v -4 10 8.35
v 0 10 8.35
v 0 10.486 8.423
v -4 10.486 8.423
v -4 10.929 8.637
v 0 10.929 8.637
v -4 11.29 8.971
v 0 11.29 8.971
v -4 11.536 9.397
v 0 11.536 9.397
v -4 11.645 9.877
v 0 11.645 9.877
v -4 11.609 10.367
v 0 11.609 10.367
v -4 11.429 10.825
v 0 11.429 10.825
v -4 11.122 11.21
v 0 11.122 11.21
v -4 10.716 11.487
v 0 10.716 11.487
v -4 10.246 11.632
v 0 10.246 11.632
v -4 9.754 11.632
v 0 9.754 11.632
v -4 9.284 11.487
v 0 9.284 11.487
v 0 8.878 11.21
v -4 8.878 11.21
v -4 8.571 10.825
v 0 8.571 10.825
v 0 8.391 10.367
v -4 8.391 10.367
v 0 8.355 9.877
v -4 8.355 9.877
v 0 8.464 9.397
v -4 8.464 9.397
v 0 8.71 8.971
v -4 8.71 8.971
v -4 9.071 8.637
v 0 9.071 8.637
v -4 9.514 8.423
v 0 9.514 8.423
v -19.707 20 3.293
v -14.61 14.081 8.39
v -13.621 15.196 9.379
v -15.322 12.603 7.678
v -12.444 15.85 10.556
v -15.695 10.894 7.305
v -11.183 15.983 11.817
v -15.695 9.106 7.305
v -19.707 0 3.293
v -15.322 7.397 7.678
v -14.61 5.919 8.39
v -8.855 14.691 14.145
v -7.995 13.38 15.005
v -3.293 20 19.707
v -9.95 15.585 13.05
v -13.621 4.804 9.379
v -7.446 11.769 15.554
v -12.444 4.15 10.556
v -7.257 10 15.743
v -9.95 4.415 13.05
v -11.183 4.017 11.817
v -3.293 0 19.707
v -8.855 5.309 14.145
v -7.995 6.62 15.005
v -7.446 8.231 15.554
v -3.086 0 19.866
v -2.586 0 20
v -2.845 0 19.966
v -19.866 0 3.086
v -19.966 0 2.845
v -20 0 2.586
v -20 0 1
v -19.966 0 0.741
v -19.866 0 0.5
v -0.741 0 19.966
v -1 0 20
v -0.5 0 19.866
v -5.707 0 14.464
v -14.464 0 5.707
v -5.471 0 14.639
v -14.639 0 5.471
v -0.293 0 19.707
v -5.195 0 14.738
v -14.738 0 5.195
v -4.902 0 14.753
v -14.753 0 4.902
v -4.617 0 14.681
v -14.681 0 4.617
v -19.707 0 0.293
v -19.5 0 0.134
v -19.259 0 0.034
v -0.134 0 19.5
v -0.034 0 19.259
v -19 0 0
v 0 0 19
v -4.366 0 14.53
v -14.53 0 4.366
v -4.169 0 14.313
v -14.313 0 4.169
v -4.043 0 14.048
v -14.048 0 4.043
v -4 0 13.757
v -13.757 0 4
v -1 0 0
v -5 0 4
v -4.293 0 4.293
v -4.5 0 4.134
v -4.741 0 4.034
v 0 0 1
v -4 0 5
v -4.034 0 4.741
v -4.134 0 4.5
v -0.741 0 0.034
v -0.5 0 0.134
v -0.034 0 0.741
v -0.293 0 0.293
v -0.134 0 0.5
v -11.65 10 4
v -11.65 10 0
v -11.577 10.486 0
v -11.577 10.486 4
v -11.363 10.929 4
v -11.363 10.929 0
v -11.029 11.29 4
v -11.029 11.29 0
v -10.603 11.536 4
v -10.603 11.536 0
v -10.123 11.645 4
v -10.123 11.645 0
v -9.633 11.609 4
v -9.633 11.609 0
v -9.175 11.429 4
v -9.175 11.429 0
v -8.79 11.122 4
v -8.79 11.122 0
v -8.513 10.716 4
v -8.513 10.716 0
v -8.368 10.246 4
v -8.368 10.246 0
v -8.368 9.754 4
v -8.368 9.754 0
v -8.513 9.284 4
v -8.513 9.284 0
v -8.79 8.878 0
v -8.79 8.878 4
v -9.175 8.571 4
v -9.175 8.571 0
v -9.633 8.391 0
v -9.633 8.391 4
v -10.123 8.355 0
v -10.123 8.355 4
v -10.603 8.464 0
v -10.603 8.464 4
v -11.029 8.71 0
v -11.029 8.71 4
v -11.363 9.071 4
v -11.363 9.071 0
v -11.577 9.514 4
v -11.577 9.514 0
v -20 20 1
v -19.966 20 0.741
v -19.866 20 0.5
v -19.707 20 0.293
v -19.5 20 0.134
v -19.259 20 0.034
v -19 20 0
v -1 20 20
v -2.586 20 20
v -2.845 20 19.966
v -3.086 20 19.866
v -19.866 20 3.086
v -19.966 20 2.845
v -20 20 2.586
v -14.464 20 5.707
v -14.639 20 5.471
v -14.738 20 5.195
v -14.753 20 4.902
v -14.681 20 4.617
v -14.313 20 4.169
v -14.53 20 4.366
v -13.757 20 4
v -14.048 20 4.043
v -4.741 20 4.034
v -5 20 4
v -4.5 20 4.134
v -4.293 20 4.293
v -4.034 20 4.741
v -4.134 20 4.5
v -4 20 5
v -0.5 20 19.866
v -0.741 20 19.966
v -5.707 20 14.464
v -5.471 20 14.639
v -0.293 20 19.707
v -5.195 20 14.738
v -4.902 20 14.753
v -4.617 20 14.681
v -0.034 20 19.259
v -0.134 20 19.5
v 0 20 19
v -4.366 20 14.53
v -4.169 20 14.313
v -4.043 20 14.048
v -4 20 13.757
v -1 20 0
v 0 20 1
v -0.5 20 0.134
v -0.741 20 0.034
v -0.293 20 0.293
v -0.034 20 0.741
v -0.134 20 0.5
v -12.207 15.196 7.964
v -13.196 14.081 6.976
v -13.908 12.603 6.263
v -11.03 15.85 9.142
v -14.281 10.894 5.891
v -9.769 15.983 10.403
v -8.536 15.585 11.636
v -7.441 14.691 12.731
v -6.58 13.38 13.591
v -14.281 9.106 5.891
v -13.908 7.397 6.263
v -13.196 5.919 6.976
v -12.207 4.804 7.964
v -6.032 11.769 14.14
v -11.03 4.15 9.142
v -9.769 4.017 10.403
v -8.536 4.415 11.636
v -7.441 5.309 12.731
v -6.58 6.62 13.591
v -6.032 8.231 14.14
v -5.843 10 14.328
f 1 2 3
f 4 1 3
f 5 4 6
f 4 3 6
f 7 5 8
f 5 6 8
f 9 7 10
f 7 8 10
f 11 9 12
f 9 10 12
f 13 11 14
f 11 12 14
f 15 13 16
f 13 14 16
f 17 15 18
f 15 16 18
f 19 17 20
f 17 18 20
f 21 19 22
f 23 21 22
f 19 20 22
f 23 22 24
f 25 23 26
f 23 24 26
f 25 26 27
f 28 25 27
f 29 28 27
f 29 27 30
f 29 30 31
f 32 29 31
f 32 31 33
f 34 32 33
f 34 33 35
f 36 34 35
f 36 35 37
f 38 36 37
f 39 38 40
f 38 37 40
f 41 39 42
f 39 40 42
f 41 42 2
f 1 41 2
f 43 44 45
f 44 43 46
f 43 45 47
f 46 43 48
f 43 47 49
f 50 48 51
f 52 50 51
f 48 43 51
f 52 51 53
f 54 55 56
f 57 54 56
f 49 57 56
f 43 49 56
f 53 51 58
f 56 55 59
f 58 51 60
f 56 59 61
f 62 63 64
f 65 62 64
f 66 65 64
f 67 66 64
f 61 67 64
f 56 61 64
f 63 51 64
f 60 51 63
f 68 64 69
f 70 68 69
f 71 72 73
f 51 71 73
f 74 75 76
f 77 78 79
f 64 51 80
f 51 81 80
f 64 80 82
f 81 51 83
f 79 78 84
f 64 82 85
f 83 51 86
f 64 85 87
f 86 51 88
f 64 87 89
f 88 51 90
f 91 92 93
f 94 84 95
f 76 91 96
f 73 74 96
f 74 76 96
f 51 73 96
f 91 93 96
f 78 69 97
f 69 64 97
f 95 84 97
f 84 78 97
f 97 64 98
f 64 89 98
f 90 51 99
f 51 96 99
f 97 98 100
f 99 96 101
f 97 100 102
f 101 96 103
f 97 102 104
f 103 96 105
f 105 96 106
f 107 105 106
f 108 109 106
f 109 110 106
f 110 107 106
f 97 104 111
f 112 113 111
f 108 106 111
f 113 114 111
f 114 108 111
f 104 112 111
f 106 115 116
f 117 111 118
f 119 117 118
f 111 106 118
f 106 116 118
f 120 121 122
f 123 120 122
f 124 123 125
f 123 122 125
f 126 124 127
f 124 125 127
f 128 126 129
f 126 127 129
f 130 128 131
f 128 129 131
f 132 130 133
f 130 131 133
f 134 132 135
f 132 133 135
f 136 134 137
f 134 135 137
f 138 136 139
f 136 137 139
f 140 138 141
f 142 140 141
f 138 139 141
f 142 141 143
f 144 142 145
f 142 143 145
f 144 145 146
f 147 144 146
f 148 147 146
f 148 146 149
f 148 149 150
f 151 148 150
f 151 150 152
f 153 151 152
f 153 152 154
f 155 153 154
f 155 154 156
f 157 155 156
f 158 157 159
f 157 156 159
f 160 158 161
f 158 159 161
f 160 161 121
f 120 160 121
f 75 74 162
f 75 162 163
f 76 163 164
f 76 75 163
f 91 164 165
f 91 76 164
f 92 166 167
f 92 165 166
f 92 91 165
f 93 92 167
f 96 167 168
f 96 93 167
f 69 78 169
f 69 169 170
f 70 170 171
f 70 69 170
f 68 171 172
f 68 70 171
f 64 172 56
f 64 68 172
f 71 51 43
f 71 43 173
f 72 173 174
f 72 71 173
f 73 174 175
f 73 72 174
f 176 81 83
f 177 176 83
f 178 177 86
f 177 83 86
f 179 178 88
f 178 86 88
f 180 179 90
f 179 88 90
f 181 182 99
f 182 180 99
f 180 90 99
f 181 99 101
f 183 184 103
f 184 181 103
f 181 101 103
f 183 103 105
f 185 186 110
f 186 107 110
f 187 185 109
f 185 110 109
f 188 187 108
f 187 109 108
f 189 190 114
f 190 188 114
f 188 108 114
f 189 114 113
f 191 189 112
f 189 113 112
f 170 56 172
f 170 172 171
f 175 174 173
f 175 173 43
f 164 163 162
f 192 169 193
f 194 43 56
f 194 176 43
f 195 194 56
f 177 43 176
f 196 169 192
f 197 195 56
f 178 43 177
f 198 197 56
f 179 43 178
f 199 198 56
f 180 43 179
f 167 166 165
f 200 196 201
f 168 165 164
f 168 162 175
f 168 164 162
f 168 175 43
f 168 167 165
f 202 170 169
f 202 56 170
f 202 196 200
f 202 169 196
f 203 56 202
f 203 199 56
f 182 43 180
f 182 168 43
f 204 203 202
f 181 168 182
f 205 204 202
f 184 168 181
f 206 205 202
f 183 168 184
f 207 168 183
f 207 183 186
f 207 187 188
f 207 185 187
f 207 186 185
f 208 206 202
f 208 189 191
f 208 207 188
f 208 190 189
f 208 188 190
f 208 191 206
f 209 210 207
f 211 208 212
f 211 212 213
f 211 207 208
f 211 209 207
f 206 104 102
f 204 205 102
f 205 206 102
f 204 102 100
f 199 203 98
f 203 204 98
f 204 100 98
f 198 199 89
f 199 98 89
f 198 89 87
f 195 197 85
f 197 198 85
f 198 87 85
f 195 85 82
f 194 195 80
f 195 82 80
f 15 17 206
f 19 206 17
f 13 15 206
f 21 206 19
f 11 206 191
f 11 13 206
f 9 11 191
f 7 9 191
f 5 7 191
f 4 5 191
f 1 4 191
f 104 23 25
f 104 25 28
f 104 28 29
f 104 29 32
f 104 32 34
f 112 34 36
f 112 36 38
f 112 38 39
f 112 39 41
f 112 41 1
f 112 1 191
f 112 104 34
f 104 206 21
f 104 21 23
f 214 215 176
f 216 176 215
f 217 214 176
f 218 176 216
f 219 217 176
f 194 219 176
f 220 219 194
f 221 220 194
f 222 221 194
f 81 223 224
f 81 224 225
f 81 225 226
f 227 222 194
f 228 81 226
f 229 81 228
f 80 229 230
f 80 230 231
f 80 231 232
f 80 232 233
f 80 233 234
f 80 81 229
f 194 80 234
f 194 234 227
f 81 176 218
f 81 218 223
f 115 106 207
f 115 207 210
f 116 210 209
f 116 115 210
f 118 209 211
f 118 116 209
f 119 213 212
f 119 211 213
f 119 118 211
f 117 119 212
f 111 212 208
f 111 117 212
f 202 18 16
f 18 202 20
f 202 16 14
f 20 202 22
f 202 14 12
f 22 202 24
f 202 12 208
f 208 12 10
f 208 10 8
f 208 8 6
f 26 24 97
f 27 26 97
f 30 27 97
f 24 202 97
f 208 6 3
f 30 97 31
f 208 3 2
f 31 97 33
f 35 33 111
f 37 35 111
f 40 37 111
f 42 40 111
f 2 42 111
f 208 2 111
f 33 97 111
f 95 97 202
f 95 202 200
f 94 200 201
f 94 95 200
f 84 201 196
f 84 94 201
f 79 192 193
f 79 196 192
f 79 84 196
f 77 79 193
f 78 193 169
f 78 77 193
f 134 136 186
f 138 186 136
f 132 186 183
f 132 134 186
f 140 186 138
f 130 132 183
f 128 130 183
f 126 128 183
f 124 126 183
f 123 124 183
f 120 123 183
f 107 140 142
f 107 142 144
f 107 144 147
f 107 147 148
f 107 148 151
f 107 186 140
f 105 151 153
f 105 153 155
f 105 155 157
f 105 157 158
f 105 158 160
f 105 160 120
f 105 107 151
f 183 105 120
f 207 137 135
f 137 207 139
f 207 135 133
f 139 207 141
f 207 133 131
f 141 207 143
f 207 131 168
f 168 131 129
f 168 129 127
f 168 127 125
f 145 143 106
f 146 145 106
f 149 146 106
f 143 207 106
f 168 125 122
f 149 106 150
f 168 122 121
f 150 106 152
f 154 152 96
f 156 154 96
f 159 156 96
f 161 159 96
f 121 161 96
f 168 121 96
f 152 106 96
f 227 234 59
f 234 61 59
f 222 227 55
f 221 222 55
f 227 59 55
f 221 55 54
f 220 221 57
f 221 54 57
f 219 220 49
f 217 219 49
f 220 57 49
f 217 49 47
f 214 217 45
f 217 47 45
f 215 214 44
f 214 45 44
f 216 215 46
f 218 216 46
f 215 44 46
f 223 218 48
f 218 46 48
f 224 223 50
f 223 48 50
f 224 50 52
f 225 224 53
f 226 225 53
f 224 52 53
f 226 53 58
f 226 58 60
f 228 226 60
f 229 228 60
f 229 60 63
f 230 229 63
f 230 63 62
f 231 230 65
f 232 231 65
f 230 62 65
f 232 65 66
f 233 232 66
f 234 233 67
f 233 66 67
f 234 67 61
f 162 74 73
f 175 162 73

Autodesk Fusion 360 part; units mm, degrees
sketch "Sketch1" plane through (0, 0, 0) normal (0, 1, 0) x (1, 0, 0)
  line L0 (0, 0) -> (-100, 0) construction
  line L1 (-100, 0) -> (-100, -100) construction
  line L2 (-100, -100) -> (0, -100) construction
  line L3 (0, -100) -> (0, 0) construction
  line L4 (10, 20) -> (-110, 20)
  line L5 (-120, 10) -> (-120, -110)
  line L6 (-110, -120) -> (10, -120)
  line L7 (20, -110) -> (20, 10)
  circle A0 centre (0, 0) radius 1.65
  circle A1 centre (-100, 0) radius 1.65
  circle A2 centre (0, -100) radius 1.65
  circle A3 centre (-100, -100) radius 1.65
  arc A4 (10, -120) -> (20, -110) centre (10, -110) ccw
  arc A5 (-120, -110) -> (-110, -120) centre (-110, -110) ccw
  arc A6 (-110, 20) -> (-120, 10) centre (-110, 10) ccw
  arc A7 (20, 10) -> (10, 20) centre (10, 10) ccw
  dimension "d1" = 100
  dimension "d2" = 100
  dimension "d4" = 3.3
  dimension "d7" = -100
  dimension "d8" = -100
  dimension "d9" = 10
extrude "Extrude1" add sketch "Sketch1" along normal blind 7 makes body 1
sketch "Sketch2" plane through (0, 7, 0) normal (0, 1, 0) x (-1, 0, 0)
  circle A0 centre (0, 0) radius 1.65
  circle A1 centre (100, 100) radius 1.65
  circle A2 centre (0, 100) radius 1.65
  circle A3 centre (100, 0) radius 1.65
  arc A4 (-20, -10) -> (-10, -20) centre (-10, -10) ccw
  line L0 (-10, -20) -> (110, -20)
  arc A5 (110, -20) -> (120, -10) centre (110, -10) ccw
  line L1 (120, -10) -> (120, 110)
  arc A6 (120, 110) -> (110, 120) centre (110, 110) ccw
  line L2 (110, 120) -> (-10, 120)
  arc A7 (-10, 120) -> (-20, 110) centre (-10, 110) ccw
  line L3 (-20, 110) -> (-20, -10)
  circle A8 centre (0, 0) radius 2.8
  circle A9 centre (100, 0) radius 2.8
  circle A10 centre (0, 100) radius 2.8
  circle A11 centre (100, 100) radius 2.8
  dimension "d12" = 5.6
  dimension "d15" = 100
  dimension "d16" = 100
extrude "Extrude2" cut sketch "Sketch2" against normal blind 3 contours A8 | A9 | A10 | A11 bodies 1
sketch "Sketch3" plane through (0, 0, 0) normal (0, 1, 0) x (1, 0, 0)
  line L0 (-1, 0) -> (-19, 0)
  line L1 (0, -19) -> (0, -1)
  line L2 (-1, -20) -> (-2.5858, -20)
  line L3 (-20, -1) -> (-20, -2.5858)
  line L4 (-19.7071, -3.2929) -> (-3.2929, -19.7071)
  line L5 (-14.4645, -5.7071) -> (-5.7071, -14.4645)
  line L6 (-5, -4) -> (-13.7574, -4)
  line L7 (-4, -13.7574) -> (-4, -5)
  arc A0 (-1, -20) -> (0, -19) centre (-1, -19) ccw
  arc A1 (-3.2929, -19.7071) -> (-2.5858, -20) centre (-2.5858, -19) ccw
  arc A2 (0, -1) -> (-1, 0) centre (-1, -1) ccw
  arc A3 (-19, 0) -> (-20, -1) centre (-19, -1) ccw
  arc A4 (-20, -2.5858) -> (-19.7071, -3.2929) centre (-19, -2.5858) ccw
  arc A5 (-5.7071, -14.4645) -> (-4, -13.7574) centre (-5, -13.7574) ccw
  arc A6 (-4, -5) -> (-5, -4) centre (-5, -5) ccw
  arc A7 (-13.7574, -4) -> (-14.4645, -5.7071) centre (-13.7574, -5) ccw
  point P0 (-20, 0)
  point P1 (0, -20)
  point P2 (-3, -20)
  point P3 (-20, -3)
  dimension "d19" = 20
  dimension "d20" = 20
  dimension "d23" = 3
  dimension "d24" = 3
  dimension "d26" = 1
  dimension "d27" = 1
  dimension "d30" = 2
extrude "Extrude3" add sketch "Sketch3" along normal blind 20 separate body makes body 2
sketch "Sketch4" plane through (0, 0, 0) normal (0, 0, -1) x (-1, 0, 0)
  line L0 (1, 0) -> (19, 0)
  line L1 (19, 0) -> (19, 20)
  line L2 (19, 20) -> (1, 20)
  line L3 (1, 20) -> (1, 0)
  circle A0 centre (10, 10) radius 1.65
  dimension "d31" = 3.3
extrude "Extrude5" cut sketch "Sketch4" against normal blind 30 contours A0 bodies 2
sketch "Sketch5" plane through (0, 0, 0) normal (1, 0, 0) x (0, 0, -1)
  line L0 (-19, 0) -> (-1, 0)
  line L1 (-1, 0) -> (-1, 20)
  line L2 (-1, 20) -> (-19, 20)
  line L3 (-19, 20) -> (-19, 0)
  circle A0 centre (-10, 10) radius 1.65
  dimension "d34" = 3.3
extrude "Extrude6" cut sketch "Sketch5" against normal blind 49 contours A0 bodies 2
sketch "Sketch6" plane through (-11.5, 0, 11.5) normal (-0.7071, 0, 0.7071) x (0.7071, 0, 0.7071)
  line L0 (-11.6066, 0) -> (11.6066, 0)
  line L1 (11.6066, 0) -> (11.6066, 20)
  line L2 (11.6066, 20) -> (-11.6066, 20)
  line L3 (-11.6066, 20) -> (-11.6066, 0)
  ellipse E0 centre (-2.1213, 10) end of major axis (-4.4548, 10) minor radius 1.65 (0, 10.6874) -> (0, 9.3126) ccw
  ellipse E1 centre (2.1213, 10) end of major axis (-0.2121, 10) minor radius 1.65 (0, 9.3126) -> (0, 10.6874) ccw
  circle A0 centre (0, 10) radius 6
  dimension "d37" = 12
extrude "Extrude7" cut sketch "Sketch6" against normal blind 3 contours E0 E1 | A0 bodies 2
extrude "Extrude4" [suppressed]
hidden bodies 1
